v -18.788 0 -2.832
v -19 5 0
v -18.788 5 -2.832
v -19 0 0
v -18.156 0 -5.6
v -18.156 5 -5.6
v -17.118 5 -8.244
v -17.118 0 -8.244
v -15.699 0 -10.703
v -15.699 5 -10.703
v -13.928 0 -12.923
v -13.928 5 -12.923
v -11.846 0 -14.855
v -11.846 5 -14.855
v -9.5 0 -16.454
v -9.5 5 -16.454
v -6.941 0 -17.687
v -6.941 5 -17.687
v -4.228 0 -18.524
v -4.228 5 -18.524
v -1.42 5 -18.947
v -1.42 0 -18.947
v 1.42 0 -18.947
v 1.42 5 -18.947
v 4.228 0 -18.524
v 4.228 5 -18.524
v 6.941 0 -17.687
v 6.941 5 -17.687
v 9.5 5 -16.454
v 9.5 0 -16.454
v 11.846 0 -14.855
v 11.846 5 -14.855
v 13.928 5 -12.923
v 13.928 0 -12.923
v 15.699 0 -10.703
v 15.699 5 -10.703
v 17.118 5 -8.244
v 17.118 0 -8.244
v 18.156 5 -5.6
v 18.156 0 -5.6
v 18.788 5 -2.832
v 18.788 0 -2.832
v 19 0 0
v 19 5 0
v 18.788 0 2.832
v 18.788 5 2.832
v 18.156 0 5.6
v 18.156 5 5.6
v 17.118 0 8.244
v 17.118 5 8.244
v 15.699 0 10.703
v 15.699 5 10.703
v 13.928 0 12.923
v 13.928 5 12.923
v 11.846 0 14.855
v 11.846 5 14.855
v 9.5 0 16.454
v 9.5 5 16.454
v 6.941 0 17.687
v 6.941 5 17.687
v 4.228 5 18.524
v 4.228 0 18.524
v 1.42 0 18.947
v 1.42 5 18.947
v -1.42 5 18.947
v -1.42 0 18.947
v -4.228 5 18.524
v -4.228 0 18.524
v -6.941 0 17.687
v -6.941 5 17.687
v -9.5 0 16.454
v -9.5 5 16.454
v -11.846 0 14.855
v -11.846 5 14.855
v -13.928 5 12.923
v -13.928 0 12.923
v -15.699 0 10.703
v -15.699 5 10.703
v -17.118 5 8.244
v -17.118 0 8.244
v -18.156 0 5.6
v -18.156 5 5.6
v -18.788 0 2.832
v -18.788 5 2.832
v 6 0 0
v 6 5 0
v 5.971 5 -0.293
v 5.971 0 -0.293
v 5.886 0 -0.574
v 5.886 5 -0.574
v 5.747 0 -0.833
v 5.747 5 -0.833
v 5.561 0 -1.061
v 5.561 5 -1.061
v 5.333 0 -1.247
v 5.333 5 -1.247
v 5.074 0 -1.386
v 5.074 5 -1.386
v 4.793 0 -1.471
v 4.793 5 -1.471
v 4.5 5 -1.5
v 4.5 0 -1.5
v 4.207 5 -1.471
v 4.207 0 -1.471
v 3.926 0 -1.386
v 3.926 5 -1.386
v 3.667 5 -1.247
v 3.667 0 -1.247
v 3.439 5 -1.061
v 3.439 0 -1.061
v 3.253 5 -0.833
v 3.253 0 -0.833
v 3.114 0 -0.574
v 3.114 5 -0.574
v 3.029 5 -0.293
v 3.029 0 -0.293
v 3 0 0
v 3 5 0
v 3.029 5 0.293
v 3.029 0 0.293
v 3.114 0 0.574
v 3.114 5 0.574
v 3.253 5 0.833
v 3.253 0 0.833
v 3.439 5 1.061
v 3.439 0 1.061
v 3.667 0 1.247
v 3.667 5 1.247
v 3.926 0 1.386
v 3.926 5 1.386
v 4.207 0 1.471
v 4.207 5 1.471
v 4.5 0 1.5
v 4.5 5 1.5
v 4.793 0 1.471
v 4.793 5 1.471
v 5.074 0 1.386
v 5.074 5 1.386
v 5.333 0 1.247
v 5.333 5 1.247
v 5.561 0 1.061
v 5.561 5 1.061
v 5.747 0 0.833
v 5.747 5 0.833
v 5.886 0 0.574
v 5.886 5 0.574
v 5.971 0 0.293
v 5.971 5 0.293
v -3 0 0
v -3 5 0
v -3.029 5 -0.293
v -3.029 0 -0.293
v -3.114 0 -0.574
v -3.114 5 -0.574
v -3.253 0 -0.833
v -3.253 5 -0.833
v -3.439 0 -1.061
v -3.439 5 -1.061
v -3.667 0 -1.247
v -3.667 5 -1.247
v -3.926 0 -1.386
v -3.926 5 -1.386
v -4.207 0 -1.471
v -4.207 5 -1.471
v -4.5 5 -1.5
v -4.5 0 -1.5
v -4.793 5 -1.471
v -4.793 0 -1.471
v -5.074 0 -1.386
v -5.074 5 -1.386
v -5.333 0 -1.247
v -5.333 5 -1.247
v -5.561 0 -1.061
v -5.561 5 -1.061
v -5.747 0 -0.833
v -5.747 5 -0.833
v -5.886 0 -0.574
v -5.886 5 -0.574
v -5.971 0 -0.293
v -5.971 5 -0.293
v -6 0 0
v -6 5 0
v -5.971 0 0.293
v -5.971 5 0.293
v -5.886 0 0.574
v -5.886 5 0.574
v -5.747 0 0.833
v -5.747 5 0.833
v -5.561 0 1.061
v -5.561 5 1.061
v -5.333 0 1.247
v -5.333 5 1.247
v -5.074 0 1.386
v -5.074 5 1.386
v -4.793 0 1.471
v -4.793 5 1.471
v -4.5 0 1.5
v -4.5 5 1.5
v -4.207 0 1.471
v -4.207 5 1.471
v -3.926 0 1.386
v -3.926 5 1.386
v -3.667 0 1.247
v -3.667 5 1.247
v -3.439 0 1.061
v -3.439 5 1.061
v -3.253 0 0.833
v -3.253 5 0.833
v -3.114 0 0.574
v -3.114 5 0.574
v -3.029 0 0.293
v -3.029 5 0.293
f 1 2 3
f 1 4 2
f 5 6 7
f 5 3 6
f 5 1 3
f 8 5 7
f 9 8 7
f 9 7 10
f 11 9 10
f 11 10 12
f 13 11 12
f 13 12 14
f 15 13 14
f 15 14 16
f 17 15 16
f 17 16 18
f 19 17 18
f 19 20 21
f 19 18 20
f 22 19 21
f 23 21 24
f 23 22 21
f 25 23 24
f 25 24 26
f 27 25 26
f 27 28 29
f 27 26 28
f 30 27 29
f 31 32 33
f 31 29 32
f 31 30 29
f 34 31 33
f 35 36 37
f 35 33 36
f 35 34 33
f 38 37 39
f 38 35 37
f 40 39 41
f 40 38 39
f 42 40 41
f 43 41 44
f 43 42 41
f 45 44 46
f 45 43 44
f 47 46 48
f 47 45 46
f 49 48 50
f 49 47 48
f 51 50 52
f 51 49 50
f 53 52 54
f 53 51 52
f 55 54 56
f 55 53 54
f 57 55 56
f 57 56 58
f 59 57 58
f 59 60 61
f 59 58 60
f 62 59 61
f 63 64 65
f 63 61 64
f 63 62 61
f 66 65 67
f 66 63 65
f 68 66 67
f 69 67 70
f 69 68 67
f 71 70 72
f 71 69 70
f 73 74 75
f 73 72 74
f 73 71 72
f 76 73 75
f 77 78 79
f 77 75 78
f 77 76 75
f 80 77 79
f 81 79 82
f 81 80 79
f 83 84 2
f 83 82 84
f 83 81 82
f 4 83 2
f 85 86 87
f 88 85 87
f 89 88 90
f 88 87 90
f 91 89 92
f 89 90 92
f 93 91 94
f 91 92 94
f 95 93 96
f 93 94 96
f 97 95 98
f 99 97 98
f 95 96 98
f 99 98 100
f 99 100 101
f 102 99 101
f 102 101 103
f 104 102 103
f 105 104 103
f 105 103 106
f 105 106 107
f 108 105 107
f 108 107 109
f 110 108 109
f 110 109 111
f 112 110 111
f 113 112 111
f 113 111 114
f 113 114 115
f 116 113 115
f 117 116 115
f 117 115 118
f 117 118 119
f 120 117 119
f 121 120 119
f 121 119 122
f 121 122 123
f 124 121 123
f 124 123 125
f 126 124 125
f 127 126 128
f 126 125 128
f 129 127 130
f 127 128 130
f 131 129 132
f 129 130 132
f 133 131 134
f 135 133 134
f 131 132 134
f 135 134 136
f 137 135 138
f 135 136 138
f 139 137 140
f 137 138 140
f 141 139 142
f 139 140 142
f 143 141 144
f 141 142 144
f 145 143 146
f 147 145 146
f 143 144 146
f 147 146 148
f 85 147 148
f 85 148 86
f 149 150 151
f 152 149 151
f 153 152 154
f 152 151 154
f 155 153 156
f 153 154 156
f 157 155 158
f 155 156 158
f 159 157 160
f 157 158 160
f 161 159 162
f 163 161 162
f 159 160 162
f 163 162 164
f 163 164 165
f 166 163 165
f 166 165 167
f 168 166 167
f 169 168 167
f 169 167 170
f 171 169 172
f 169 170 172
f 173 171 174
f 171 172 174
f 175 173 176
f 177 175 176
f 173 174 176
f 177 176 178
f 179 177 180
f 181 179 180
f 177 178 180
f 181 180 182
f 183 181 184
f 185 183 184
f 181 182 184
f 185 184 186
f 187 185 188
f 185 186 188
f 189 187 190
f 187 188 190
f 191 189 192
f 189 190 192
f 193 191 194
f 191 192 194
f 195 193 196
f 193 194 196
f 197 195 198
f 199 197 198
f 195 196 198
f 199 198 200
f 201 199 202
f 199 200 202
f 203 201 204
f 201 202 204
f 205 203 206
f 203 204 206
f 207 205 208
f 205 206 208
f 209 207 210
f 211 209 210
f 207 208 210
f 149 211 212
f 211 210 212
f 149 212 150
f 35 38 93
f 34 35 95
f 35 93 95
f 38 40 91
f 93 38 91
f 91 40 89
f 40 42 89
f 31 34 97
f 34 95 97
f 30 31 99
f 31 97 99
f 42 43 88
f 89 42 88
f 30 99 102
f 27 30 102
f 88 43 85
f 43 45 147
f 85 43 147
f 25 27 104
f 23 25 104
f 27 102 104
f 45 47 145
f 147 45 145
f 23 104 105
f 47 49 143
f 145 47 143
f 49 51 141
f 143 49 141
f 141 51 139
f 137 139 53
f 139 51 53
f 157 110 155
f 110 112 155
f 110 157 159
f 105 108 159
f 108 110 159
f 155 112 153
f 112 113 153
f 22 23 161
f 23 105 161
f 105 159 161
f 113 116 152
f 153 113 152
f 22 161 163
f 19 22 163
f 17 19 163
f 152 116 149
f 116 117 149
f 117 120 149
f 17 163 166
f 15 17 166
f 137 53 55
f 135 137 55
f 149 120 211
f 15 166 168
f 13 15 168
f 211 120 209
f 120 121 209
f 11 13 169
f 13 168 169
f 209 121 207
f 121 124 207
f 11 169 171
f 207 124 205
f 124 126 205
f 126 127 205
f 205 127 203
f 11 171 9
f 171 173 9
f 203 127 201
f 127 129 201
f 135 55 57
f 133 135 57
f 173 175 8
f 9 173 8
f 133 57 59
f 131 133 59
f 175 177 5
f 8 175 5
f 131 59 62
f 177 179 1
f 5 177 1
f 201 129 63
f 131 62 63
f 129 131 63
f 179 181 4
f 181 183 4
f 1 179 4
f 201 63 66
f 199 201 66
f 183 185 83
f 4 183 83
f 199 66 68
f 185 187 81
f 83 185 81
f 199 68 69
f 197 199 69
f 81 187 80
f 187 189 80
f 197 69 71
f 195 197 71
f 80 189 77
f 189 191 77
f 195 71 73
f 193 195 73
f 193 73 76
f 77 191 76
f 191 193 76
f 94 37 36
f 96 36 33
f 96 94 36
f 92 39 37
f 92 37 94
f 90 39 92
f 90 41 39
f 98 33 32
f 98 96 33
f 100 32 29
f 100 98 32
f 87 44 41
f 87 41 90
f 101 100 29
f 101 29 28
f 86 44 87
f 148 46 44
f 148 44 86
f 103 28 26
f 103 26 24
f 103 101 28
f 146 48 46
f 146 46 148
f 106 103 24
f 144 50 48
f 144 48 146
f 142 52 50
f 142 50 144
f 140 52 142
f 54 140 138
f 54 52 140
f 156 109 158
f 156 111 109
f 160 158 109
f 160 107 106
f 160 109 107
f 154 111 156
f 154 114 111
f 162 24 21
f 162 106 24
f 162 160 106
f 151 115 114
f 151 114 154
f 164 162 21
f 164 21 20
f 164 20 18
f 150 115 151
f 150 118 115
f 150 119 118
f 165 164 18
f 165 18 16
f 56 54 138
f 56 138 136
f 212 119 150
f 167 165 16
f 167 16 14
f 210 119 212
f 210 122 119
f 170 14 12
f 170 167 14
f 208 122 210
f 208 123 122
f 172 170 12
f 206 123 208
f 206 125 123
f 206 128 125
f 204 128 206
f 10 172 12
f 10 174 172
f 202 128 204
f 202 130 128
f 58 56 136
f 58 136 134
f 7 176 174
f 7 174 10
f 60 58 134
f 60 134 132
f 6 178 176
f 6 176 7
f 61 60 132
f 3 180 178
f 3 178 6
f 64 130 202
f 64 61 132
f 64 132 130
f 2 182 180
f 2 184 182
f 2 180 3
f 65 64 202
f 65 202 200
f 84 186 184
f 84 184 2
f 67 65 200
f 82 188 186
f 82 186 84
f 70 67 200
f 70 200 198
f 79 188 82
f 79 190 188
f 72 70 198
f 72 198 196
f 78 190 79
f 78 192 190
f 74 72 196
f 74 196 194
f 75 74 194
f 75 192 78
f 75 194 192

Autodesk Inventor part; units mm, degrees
ref_plane "YZ Plane" through (0, 0, 0) normal (1, 0, 0) x (0, 1, 0)
ref_plane "XZ Plane" through (0, 0, 0) normal (0, 1, 0) x (-1, 0, 0)
ref_plane "XY Plane" through (0, 0, 0) normal (0, 0, 1) x (1, 0, 0)
sketch "Sketch1" plane through (0, 0, 0) normal (0, 1, 0) x (-1, 0, 0)
  circle A0 centre (0, 0) radius 19
  dimension "d0" = 38
extrude "Extrusion1" add sketch "Sketch1" along normal blind 5
sketch "Sketch2" plane through (0, 5, 0) normal (0, 1, 0) x (1, 0, 0)
  circle A0 centre (-4.5, 0) radius 1.5
  circle A1 centre (4.5, 0) radius 1.5
  point P0 (0, 0)
  dimension "d5" = 3
  dimension "d6" = 3
extrude "Extrusion2" cut sketch "Sketch2" against normal blind 5 contours A0
extrude "Extrusion3" cut sketch "Sketch2" against normal blind 5 contours A1
thread "Thread1" size "M3x0.5" class "6H" standard "ANSI Metric M Profile" full length
thread "Thread2" size "M3x0.5" class "6H" standard "ANSI Metric M Profile" full length
properties part number "tapa"
